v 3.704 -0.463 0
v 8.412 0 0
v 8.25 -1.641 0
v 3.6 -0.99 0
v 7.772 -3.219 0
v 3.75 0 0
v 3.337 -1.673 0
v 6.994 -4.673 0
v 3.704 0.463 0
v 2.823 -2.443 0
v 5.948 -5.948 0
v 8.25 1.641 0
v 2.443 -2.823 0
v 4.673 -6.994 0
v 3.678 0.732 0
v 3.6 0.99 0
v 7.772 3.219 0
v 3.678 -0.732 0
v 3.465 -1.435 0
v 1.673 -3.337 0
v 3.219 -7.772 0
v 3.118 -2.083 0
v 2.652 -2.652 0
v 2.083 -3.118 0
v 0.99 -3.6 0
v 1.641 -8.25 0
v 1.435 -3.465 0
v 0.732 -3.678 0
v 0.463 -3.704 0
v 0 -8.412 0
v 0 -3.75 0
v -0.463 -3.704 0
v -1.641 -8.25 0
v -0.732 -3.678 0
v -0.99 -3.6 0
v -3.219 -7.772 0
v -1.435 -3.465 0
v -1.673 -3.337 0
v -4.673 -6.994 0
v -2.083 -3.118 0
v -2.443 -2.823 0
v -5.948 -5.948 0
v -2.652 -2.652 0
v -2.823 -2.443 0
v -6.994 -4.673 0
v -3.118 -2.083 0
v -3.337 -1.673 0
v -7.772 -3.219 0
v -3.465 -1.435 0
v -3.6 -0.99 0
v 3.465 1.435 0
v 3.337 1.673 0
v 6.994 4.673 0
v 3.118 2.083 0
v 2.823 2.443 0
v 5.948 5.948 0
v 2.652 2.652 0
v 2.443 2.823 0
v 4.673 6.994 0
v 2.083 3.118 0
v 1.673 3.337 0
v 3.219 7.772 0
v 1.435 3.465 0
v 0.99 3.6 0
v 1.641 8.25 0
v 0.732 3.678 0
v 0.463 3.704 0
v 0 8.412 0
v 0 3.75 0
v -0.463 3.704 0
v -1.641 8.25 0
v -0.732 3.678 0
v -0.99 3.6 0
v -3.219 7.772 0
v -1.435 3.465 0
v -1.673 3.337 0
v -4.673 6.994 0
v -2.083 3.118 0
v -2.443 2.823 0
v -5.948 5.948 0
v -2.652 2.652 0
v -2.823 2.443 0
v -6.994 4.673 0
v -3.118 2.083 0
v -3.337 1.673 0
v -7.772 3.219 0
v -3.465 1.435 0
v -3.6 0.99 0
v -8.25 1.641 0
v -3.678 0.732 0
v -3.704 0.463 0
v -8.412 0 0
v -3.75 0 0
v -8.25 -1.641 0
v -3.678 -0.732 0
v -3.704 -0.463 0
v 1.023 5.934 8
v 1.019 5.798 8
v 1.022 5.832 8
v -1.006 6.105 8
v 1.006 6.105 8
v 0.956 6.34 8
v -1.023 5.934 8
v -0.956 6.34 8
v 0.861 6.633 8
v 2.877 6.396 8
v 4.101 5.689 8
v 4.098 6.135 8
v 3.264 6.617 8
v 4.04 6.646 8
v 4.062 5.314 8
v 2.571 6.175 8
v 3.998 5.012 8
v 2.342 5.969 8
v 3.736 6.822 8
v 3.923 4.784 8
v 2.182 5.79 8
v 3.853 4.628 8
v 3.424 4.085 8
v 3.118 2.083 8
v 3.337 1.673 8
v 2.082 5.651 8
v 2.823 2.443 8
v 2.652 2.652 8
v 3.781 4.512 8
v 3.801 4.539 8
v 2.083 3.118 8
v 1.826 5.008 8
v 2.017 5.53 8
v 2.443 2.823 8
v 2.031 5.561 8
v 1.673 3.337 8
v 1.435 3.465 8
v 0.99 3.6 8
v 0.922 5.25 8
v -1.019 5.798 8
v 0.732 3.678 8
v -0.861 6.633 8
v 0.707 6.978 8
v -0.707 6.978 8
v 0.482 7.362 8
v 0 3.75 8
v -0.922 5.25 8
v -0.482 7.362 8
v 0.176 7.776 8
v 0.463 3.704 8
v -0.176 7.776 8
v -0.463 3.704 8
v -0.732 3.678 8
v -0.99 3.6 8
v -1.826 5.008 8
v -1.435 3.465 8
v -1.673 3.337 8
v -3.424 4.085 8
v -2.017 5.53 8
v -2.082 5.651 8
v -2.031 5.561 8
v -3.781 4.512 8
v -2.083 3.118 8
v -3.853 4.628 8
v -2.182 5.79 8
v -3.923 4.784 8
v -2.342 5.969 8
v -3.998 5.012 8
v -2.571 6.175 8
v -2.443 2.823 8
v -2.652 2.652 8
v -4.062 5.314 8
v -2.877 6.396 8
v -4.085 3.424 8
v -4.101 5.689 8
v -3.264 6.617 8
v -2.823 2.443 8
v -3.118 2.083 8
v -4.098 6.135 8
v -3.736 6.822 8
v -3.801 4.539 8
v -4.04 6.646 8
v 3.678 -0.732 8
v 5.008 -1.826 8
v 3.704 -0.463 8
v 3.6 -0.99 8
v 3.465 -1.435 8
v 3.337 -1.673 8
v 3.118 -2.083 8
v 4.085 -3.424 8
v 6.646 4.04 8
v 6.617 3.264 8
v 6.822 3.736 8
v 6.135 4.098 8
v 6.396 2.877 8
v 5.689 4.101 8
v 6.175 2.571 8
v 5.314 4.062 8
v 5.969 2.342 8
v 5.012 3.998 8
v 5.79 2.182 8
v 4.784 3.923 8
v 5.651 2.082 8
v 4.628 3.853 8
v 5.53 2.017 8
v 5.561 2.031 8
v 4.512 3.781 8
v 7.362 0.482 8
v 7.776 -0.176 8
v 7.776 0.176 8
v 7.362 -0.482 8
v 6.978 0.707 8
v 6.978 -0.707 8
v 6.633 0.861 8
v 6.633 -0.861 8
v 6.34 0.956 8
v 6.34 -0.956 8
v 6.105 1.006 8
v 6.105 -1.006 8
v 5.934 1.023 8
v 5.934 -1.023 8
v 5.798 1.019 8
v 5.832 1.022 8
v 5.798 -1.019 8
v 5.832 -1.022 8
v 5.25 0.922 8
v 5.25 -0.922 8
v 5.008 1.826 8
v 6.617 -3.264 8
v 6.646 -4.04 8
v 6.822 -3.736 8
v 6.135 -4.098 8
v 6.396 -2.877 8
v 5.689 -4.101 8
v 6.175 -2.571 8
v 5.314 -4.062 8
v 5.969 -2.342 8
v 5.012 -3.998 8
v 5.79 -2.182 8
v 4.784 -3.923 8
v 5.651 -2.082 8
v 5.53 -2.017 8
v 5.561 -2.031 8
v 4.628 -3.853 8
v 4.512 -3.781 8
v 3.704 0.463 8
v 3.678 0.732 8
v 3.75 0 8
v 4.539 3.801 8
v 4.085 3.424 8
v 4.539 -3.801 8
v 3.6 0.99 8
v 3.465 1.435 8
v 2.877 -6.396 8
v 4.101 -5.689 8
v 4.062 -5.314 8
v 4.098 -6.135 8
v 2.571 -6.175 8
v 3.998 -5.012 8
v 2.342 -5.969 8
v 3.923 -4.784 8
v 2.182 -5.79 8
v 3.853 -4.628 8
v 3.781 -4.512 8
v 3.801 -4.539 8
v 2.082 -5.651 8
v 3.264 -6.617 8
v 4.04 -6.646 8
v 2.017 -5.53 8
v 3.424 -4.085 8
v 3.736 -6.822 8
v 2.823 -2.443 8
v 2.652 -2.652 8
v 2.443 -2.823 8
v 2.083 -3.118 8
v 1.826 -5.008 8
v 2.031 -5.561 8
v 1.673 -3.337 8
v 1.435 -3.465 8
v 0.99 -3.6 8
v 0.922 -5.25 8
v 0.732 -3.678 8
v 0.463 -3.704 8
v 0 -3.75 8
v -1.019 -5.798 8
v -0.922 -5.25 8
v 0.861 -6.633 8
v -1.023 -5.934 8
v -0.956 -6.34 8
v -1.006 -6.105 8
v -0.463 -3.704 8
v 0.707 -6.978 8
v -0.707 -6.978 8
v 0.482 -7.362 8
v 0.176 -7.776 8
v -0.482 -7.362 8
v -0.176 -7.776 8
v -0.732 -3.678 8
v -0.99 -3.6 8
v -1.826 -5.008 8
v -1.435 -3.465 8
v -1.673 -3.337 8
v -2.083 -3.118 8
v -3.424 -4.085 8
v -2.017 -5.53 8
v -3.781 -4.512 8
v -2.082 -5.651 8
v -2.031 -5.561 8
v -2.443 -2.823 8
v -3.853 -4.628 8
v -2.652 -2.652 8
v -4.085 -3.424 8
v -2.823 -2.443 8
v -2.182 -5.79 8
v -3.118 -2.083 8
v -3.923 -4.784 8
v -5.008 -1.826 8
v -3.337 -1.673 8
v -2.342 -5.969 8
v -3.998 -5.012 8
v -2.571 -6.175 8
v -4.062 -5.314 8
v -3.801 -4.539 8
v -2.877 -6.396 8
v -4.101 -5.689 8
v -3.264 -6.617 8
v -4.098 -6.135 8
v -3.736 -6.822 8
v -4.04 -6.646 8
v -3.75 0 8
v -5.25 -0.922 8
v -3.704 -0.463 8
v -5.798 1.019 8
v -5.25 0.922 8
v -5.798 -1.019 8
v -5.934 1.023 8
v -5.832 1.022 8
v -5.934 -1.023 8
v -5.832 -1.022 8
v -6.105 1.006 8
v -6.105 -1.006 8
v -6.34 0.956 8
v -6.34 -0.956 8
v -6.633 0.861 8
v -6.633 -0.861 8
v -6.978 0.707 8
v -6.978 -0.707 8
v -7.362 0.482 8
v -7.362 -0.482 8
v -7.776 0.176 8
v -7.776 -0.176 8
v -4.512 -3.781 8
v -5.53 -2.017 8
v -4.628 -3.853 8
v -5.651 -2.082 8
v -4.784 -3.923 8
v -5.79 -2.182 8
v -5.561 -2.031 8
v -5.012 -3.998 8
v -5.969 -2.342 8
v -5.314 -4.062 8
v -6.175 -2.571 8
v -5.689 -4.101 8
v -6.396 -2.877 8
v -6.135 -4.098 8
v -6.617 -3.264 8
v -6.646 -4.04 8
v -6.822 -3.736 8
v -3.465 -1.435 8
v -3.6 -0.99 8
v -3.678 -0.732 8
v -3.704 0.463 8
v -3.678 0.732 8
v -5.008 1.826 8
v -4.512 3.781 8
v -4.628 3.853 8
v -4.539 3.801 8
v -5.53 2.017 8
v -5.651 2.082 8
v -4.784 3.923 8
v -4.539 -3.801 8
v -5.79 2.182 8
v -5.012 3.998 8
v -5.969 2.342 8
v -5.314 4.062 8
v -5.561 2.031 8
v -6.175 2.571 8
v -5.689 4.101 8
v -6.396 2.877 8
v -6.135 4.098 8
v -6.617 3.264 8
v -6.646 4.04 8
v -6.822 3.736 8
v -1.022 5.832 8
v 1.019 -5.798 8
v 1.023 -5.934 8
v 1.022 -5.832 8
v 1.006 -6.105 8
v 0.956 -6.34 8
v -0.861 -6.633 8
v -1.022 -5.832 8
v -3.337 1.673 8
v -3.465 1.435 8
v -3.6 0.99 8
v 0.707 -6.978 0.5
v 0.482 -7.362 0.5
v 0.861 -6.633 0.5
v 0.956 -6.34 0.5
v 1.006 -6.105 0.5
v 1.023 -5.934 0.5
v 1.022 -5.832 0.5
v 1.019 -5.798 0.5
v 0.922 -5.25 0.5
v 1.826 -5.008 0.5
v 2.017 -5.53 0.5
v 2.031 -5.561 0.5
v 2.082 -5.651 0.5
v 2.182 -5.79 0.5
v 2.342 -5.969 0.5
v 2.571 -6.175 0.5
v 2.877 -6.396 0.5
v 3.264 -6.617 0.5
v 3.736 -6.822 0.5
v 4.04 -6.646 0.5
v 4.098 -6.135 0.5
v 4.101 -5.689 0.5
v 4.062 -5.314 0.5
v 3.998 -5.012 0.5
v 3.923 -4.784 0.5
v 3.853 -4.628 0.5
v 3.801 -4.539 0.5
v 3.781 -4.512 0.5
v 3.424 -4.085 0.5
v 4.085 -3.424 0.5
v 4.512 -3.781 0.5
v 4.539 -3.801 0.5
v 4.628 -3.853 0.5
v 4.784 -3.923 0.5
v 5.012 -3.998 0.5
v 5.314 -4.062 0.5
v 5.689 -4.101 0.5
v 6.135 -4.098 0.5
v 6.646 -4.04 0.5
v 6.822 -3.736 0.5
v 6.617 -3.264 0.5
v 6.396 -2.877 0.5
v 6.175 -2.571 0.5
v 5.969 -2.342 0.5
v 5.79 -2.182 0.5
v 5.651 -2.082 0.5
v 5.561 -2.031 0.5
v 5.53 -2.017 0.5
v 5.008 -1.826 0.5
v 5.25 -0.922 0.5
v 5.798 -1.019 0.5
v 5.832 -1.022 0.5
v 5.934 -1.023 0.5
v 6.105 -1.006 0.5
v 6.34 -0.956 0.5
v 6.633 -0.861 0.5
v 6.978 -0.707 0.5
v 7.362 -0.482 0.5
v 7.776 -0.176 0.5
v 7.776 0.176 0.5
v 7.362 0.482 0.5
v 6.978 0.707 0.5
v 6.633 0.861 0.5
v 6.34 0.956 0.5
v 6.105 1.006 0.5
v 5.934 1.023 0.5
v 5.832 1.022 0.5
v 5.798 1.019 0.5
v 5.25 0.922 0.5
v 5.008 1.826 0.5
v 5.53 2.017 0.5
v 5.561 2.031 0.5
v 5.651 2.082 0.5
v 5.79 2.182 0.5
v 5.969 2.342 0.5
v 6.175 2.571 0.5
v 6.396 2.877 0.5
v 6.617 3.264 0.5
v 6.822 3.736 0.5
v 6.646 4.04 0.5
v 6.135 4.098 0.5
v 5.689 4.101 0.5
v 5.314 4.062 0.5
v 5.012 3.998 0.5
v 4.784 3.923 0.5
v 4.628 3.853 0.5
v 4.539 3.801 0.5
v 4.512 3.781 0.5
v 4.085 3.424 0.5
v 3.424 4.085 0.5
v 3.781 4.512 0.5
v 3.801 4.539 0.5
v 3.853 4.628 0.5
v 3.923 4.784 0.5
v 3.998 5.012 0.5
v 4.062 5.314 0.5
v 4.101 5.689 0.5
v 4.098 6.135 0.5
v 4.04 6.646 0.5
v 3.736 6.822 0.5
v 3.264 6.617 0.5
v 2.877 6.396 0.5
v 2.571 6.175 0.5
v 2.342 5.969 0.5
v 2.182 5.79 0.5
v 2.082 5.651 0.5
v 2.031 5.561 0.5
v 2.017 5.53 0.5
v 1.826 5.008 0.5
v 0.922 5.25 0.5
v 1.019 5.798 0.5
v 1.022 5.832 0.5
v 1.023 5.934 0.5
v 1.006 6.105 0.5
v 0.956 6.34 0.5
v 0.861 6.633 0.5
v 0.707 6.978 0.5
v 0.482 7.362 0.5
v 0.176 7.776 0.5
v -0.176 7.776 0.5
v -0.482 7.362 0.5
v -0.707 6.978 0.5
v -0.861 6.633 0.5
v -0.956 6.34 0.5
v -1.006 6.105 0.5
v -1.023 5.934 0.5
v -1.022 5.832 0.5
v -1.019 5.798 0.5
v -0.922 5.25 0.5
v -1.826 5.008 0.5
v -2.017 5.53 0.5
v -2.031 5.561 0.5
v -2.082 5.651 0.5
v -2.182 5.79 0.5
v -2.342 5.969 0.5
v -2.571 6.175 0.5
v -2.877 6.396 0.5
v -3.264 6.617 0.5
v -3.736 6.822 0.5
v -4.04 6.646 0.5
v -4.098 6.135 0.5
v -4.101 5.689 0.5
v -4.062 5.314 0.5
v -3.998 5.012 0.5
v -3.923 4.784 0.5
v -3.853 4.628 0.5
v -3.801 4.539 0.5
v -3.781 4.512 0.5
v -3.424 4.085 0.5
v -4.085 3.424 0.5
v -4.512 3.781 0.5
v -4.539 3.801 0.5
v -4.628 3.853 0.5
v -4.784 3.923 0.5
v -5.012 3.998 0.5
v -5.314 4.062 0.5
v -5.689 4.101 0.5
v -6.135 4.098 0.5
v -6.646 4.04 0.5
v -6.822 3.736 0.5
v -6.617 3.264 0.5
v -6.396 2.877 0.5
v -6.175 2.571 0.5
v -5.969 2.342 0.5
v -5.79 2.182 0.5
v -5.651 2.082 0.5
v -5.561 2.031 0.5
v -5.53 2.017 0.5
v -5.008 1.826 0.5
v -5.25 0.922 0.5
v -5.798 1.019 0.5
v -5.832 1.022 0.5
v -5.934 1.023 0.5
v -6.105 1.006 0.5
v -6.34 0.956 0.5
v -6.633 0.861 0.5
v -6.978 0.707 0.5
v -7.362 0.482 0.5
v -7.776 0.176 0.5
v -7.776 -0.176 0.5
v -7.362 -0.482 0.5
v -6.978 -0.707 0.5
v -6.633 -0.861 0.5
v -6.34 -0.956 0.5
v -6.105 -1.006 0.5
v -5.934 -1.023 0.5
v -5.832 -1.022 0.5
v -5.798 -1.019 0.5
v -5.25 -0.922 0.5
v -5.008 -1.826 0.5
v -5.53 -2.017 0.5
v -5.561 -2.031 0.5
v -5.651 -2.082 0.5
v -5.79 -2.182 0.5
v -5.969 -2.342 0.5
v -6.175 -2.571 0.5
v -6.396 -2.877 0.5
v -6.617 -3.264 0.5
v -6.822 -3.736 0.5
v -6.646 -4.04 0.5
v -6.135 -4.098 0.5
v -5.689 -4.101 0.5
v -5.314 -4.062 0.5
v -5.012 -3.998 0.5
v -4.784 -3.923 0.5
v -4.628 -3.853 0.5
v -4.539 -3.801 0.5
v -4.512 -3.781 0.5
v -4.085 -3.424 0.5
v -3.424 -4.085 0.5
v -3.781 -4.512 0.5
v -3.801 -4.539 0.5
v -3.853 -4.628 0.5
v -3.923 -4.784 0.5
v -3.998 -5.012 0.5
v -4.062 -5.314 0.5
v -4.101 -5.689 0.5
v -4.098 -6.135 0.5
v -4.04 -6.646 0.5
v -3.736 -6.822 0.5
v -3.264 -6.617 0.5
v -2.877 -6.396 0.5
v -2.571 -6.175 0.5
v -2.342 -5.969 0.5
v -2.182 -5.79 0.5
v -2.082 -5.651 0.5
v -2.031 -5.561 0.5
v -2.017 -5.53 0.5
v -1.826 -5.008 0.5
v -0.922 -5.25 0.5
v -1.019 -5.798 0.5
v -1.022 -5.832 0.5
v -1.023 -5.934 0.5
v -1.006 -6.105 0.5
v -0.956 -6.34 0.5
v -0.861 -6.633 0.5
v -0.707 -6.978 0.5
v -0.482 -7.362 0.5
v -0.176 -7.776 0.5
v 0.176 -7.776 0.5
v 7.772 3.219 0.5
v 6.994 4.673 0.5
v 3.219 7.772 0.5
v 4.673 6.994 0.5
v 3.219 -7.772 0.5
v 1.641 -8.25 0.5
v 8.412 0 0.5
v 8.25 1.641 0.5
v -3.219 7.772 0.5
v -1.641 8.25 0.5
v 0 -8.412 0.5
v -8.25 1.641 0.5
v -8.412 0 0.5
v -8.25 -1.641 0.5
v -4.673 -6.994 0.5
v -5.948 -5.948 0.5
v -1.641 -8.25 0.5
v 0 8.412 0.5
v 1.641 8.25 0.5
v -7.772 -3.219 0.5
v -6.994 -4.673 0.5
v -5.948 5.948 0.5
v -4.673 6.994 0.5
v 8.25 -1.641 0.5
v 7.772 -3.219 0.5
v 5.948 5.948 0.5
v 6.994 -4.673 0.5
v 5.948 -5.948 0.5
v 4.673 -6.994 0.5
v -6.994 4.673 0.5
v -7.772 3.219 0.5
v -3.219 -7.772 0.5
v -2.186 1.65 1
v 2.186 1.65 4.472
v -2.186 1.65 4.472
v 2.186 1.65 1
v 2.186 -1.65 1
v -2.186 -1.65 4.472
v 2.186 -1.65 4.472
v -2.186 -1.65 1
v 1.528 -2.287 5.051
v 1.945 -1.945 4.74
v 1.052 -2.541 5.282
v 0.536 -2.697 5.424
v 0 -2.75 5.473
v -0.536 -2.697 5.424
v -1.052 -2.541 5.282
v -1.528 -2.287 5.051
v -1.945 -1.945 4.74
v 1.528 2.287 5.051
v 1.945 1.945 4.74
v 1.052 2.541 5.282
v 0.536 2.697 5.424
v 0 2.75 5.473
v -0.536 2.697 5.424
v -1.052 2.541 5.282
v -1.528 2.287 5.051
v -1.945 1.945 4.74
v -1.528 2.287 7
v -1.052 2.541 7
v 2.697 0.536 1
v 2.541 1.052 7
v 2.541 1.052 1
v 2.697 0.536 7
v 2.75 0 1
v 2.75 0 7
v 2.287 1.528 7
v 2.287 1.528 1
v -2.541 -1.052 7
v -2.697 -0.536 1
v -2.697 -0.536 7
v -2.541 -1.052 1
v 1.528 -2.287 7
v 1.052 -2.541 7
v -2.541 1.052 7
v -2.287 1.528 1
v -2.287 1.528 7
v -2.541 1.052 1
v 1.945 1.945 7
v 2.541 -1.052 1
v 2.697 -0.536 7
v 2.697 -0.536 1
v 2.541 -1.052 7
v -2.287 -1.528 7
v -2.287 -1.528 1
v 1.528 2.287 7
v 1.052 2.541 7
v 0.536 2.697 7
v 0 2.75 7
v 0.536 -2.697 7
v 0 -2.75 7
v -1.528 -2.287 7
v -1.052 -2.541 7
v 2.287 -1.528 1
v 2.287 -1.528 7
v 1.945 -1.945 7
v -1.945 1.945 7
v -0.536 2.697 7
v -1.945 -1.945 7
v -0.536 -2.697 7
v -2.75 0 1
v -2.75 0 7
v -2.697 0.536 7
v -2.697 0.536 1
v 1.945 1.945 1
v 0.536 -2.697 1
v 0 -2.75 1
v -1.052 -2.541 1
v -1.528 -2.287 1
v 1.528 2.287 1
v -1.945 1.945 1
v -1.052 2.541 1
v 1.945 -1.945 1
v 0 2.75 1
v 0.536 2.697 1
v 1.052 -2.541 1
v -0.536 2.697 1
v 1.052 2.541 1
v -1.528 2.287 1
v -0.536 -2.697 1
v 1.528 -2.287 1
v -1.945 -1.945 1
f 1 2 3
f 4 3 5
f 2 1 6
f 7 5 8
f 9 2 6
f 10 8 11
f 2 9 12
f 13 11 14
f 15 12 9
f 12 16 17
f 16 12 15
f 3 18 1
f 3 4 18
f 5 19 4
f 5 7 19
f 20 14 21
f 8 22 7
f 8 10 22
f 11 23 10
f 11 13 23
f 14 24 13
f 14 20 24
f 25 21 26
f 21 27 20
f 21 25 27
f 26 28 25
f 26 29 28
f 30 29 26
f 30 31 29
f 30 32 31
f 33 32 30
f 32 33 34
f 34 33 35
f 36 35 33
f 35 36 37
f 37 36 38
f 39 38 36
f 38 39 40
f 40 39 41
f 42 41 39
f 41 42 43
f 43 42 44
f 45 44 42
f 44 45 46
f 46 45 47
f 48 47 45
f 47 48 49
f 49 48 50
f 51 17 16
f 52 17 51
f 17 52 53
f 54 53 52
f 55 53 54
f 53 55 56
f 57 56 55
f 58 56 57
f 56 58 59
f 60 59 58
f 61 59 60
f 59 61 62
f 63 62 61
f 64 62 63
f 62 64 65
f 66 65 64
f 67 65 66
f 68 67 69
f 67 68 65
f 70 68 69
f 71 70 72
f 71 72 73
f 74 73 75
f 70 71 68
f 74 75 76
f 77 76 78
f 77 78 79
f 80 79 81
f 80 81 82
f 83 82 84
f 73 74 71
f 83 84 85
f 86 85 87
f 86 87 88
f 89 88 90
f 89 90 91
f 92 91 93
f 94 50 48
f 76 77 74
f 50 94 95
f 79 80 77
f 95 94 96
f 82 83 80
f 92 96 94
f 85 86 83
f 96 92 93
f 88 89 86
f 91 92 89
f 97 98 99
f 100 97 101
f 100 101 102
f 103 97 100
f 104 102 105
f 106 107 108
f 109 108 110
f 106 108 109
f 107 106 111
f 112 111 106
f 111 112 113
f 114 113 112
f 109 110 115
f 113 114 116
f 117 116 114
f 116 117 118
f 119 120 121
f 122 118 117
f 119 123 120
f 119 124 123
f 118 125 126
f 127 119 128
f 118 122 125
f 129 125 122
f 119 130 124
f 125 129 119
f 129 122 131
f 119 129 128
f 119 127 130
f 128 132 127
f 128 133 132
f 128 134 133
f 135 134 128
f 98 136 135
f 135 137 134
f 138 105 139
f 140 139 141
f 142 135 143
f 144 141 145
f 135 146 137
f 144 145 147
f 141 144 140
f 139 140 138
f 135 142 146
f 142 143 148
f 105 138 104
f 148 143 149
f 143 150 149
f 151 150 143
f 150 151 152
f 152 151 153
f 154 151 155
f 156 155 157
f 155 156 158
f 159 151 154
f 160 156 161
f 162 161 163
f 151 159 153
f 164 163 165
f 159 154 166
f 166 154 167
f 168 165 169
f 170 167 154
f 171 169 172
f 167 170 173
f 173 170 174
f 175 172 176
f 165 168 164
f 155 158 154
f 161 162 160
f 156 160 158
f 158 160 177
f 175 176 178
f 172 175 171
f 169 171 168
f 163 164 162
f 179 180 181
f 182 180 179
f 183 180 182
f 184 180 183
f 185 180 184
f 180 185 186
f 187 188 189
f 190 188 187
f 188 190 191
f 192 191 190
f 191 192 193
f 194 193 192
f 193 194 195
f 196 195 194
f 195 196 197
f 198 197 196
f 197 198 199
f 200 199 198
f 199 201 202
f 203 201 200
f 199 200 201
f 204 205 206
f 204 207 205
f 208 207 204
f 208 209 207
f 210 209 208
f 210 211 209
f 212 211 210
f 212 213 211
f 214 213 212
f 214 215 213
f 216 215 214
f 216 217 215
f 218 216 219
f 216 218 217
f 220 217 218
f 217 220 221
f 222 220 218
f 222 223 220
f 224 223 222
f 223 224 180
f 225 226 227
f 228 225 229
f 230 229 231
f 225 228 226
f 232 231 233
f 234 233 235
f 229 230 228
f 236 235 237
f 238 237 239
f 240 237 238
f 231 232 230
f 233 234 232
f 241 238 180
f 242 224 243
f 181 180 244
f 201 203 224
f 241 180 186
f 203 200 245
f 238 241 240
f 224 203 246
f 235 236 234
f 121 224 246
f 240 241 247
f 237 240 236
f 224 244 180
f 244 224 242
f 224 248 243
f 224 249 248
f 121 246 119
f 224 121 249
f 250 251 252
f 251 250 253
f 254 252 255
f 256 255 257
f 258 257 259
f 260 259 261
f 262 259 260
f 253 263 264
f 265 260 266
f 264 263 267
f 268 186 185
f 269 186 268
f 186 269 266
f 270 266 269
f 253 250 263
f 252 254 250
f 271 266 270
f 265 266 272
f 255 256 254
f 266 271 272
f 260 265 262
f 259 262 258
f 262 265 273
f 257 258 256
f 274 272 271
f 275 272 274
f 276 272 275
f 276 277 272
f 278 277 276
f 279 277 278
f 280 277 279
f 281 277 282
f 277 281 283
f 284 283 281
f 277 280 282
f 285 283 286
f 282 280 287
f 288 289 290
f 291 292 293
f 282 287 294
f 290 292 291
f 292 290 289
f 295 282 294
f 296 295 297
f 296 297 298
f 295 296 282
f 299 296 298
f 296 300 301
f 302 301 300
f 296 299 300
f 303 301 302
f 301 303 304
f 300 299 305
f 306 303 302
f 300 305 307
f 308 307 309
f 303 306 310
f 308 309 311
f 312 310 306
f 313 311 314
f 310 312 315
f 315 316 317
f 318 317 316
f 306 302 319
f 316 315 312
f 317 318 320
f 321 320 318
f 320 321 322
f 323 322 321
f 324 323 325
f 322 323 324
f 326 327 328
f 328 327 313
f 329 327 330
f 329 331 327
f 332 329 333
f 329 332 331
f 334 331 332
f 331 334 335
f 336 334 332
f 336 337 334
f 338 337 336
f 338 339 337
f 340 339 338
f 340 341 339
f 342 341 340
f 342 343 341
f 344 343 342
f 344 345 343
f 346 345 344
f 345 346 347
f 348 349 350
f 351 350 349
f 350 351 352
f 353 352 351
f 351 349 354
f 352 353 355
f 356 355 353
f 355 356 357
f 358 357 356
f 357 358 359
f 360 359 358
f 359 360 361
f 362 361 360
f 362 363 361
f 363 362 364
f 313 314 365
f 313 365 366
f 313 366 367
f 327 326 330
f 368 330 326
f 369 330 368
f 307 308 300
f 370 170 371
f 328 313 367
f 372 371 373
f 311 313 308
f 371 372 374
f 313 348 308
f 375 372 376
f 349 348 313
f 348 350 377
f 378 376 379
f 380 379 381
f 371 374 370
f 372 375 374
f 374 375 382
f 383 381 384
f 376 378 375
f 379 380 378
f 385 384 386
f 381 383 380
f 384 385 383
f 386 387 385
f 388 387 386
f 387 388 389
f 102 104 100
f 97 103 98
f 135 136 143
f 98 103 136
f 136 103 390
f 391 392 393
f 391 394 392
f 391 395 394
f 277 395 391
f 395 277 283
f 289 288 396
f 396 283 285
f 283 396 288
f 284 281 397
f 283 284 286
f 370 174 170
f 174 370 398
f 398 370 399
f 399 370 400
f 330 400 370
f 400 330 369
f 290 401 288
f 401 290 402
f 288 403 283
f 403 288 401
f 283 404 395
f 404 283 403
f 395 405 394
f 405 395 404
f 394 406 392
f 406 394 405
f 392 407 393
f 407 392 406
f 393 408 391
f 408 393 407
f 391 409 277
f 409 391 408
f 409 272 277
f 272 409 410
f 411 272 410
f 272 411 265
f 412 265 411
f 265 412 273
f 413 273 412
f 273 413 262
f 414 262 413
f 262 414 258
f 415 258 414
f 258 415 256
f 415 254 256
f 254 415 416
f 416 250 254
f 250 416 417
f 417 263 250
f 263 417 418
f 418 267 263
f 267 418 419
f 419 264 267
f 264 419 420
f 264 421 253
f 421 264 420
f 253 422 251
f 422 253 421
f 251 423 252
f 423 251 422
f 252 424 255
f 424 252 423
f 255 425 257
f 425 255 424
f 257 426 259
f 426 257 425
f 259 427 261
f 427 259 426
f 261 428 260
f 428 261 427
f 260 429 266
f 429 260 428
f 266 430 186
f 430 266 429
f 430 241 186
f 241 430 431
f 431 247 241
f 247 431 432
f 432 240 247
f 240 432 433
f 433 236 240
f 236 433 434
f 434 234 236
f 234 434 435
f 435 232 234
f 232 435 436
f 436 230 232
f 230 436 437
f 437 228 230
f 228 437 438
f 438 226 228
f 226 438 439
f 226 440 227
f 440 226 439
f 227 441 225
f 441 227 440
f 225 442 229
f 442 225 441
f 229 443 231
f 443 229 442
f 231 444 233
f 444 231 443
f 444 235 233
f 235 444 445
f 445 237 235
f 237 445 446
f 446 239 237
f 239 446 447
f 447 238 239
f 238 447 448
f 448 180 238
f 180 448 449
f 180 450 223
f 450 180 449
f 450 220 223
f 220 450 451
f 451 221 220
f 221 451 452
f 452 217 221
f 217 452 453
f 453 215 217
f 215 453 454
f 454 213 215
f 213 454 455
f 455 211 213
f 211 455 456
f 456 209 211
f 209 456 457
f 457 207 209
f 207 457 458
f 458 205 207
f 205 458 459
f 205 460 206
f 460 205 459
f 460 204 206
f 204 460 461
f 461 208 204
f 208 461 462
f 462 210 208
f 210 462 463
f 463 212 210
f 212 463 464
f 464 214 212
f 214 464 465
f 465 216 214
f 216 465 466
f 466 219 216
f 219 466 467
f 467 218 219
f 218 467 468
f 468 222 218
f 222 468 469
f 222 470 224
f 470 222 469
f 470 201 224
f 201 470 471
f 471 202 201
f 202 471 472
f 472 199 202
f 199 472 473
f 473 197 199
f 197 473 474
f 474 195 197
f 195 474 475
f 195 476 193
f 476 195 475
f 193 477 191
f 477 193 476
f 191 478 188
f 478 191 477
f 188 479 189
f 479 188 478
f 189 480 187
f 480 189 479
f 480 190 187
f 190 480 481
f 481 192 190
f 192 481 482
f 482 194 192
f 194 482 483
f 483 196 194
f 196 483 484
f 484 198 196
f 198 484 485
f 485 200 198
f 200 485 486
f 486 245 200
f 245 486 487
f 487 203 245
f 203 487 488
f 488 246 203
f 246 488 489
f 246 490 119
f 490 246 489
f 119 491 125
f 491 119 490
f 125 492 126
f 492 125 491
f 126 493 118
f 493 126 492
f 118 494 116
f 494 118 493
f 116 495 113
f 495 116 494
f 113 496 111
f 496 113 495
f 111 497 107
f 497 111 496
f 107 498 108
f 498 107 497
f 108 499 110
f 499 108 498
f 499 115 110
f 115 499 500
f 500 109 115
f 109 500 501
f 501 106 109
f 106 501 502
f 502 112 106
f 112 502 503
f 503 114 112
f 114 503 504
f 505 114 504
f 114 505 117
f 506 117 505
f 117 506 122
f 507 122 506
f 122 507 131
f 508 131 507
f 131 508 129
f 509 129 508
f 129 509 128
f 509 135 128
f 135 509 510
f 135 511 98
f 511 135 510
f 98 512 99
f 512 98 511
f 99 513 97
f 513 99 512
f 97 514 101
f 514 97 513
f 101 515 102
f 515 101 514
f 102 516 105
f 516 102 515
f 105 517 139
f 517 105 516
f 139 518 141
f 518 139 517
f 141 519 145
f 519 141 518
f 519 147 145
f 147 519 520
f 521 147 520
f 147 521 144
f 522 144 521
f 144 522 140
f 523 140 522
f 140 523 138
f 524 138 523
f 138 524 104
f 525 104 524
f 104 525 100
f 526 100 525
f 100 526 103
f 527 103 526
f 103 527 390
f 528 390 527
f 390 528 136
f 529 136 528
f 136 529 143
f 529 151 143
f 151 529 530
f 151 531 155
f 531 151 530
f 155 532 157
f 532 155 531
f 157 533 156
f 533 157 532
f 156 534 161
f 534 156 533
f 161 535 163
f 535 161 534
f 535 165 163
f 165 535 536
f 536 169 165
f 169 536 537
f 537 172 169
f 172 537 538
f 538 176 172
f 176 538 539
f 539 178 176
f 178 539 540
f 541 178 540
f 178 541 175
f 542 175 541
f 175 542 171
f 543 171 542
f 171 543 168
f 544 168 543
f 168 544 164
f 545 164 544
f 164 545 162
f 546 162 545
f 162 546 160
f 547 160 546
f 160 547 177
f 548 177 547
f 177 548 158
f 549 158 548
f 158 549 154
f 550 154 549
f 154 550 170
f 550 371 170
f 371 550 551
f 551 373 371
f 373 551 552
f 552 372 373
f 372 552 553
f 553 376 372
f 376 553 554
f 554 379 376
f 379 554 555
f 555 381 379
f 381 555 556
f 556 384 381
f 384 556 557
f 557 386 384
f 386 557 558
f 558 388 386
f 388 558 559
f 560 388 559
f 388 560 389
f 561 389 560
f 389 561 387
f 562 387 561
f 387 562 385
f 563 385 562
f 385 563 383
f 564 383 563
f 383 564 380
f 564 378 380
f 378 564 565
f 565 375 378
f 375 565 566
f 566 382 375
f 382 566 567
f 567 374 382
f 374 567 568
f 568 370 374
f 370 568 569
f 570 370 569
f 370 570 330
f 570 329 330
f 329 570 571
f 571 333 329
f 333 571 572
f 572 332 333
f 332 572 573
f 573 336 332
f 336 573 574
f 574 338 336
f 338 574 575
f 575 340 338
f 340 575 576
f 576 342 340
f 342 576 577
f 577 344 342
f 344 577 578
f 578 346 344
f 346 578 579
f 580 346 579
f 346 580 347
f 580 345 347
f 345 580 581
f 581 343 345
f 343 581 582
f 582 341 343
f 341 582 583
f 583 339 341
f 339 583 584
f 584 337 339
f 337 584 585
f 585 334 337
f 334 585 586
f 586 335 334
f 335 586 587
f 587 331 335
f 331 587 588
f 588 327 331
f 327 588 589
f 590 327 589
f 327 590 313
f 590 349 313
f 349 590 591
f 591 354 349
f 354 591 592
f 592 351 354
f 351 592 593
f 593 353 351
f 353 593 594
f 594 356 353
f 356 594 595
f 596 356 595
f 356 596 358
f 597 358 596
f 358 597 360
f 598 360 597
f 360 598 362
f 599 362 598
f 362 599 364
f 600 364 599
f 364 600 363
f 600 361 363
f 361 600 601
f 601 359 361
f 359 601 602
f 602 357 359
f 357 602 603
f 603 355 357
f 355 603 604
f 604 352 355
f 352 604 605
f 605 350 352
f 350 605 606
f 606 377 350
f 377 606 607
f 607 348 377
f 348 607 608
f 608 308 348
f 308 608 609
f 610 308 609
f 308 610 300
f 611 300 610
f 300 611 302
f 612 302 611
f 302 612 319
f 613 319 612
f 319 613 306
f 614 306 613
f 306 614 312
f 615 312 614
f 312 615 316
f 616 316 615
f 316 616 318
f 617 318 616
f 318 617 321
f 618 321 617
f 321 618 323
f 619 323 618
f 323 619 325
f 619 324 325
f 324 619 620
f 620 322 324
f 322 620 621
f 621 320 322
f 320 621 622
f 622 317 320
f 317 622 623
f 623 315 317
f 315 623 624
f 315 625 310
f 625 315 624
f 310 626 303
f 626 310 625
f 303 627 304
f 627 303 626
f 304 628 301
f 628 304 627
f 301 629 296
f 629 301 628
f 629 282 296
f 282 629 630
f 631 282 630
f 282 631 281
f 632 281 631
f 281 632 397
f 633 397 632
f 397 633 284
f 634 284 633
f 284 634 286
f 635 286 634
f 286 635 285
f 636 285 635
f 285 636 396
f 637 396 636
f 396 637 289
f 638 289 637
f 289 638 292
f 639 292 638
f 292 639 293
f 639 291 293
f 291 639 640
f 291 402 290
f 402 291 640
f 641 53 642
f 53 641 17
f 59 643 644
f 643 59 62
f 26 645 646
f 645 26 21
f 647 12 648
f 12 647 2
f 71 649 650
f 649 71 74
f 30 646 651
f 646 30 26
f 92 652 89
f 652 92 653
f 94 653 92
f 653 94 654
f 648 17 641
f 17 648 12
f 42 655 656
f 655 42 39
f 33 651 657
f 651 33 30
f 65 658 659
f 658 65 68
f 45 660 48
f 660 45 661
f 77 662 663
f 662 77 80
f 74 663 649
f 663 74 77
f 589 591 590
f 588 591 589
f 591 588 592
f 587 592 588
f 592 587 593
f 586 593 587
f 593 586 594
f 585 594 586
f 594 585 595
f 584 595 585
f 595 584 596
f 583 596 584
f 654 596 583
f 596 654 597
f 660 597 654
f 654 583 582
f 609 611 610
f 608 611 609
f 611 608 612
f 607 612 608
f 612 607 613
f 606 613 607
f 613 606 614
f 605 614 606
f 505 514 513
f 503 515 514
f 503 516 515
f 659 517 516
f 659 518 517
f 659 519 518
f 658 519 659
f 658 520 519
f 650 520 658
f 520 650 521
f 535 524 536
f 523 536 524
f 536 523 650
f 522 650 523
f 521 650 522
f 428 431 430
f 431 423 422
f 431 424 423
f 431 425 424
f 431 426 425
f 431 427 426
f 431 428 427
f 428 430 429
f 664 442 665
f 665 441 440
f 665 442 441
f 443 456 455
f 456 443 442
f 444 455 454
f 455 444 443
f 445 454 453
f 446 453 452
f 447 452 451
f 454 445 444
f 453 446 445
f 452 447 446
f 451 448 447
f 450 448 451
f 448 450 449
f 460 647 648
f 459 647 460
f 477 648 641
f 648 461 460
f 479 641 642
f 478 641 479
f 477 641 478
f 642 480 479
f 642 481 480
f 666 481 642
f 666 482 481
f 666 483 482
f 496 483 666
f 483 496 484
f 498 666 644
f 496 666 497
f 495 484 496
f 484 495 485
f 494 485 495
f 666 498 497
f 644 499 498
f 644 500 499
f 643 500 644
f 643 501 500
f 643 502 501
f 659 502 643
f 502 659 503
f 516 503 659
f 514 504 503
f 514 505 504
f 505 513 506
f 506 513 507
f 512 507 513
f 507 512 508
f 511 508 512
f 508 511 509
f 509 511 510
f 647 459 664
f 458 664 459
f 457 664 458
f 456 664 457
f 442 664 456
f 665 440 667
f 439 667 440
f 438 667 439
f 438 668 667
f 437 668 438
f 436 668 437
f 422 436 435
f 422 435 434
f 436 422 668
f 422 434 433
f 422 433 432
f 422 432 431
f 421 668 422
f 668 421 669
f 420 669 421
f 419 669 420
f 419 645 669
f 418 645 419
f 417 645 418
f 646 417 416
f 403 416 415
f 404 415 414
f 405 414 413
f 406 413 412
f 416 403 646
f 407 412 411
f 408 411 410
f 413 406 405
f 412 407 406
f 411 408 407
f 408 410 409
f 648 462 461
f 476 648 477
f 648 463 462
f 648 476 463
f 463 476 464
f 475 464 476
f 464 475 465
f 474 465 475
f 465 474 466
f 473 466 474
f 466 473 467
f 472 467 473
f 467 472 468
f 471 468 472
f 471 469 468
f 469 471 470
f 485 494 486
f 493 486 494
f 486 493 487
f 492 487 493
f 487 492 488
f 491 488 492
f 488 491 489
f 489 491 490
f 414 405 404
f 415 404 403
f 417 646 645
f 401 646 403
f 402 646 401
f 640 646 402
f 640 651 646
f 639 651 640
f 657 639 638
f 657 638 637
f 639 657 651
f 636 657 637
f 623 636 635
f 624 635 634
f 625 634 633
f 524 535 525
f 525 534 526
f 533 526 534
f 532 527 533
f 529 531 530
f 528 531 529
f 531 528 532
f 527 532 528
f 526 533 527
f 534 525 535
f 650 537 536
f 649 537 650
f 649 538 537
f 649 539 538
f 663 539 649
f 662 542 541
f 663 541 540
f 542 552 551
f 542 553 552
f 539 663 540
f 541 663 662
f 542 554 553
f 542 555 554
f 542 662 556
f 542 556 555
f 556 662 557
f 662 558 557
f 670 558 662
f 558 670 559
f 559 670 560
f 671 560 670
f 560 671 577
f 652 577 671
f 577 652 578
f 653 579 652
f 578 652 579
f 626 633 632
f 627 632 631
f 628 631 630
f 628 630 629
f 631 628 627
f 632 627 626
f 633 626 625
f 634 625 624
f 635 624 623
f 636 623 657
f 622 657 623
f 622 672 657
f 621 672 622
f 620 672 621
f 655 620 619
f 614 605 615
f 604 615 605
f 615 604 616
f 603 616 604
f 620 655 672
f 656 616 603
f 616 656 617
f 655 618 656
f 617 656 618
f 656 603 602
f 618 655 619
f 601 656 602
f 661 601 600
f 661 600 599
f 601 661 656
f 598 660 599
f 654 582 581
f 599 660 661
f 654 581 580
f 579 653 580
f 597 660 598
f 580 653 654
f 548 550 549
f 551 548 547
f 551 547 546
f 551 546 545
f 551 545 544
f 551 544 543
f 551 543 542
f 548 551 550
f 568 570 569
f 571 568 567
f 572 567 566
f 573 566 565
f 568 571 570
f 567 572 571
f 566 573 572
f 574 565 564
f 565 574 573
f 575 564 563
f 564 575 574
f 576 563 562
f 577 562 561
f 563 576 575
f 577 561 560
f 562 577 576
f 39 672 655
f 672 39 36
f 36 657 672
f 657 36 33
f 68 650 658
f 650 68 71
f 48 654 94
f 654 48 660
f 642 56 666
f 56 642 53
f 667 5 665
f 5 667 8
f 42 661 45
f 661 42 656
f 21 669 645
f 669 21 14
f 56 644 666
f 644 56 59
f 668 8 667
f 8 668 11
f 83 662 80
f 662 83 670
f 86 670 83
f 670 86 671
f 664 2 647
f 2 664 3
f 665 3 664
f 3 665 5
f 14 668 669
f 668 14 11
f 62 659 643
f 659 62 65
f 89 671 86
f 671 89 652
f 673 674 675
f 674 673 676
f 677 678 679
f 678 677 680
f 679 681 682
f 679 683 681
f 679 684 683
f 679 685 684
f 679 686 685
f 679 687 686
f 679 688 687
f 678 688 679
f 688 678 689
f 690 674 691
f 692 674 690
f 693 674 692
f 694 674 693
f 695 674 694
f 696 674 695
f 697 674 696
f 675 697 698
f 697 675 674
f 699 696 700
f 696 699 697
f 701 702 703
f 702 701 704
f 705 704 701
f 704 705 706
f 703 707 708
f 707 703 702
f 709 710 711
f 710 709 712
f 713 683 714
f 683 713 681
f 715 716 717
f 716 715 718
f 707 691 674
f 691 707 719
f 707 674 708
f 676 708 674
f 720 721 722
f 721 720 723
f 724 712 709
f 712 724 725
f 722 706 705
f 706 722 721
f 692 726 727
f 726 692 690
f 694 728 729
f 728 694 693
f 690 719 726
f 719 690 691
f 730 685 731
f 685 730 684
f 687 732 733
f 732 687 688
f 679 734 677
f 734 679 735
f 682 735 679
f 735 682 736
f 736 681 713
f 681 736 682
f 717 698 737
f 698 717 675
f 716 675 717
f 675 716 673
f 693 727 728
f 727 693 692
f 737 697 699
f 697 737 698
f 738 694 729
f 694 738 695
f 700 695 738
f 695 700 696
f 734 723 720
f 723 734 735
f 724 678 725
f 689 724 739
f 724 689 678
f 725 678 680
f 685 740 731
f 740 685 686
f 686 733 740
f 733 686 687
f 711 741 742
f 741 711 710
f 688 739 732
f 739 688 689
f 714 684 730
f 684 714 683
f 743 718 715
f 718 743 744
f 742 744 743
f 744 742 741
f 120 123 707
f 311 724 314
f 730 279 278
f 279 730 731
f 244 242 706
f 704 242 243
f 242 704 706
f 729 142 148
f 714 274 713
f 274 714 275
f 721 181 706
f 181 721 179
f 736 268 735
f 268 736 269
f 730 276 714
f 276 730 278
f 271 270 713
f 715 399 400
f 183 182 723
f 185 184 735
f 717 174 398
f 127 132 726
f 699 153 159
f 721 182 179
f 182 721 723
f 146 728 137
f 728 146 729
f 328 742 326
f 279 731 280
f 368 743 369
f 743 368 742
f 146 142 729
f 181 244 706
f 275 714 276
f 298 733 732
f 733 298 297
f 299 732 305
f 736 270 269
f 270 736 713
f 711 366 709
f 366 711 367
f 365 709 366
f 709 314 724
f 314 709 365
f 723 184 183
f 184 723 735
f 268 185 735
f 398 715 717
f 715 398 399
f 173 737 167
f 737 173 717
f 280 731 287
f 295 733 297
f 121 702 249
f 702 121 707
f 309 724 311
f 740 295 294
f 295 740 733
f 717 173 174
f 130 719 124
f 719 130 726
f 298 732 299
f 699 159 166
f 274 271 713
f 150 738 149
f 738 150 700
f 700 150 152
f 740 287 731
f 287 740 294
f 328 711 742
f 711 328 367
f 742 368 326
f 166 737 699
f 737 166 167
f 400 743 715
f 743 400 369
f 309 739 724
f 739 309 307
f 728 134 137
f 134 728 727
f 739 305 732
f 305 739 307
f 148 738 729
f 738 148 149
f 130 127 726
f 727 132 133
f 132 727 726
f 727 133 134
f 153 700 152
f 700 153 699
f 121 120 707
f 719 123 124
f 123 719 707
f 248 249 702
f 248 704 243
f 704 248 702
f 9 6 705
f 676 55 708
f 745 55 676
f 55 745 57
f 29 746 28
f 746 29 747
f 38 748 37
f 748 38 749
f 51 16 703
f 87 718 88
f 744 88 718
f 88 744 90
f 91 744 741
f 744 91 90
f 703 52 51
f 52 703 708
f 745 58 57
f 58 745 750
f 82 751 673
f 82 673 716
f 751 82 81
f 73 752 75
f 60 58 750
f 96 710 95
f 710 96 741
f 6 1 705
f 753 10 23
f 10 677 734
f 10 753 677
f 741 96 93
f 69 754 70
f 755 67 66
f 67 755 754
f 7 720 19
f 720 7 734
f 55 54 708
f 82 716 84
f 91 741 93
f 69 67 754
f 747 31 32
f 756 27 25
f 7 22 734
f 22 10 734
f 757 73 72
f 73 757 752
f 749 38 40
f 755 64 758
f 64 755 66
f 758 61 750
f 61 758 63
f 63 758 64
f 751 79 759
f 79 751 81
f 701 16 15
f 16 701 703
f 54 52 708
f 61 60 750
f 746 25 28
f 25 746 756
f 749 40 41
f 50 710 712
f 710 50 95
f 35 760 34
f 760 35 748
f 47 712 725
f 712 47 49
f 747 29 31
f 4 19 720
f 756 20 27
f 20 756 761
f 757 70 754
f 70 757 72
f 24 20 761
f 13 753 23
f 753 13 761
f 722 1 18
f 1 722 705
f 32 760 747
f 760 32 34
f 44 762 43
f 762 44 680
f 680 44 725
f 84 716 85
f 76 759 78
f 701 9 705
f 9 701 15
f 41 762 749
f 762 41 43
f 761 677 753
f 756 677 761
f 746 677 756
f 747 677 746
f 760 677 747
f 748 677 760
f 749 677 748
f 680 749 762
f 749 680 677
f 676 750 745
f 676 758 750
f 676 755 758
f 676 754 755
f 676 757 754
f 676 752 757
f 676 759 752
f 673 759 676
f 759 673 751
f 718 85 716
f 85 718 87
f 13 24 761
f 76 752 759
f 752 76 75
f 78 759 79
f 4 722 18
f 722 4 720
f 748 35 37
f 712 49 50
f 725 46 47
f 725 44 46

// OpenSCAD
// file: gears.scad
/******************************************************************
*                                                                 *
* OpenFlexure Microscope: Gears for actuators                     *
*                                                                 *
* This is part of the OpenFlexure microscope, an open-source      *
* microscope and 3-axis translation stage.  It gets really good   *
* precision over a ~10mm range, by using plastic flexure          *
* mechanisms.                                                     *
*                                                                 *
* (c) Richard Bowman, January 2016                                *
* Released under the CERN Open Hardware License                   *
*                                                                 *
******************************************************************/

use <MCAD/involute_gears.scad>; //NB forward slash - it works on 
// both unix-like and Windows platforms. Backslash doesn't...
use <utilities.scad>;

//pi=3.14159;
//$fn=32;
strut_t=3;
depth = 40;
ratio = 2;
teeth_smallgear = 12;
teeth_biggear = teeth_smallgear * ratio;
c2c_distance = 20; //see output from motor_lugs
pitch = c2c_distance * 360 / (teeth_smallgear + teeth_biggear);
d=0.05;

//pitch radius = Nteeth * circular_pitch / 360
//pitch radius is centre of gear to meshing point
//outer radius = pitch radius * (1 + 2*pi/Nteeth)
//our c2c distance is 10+12.5mm=22.5mm, 
module large_gear(){
	assign($fn=32, pi=3.14159, pitch_r=c2c_distance*(ratio/(ratio+1)))
	difference(){
		intersection(){
			gear(number_of_teeth=teeth_biggear,
				circular_pitch=pitch,
				circles=0,
				gear_thickness=6,
				hub_thickness=6,
				hub_diameter=20,
				rim_thickness=6,
				bore_diameter=1);	
			cylinder(r1=pitch_r-2,r2=pitch_r+18,h=20); //stop bottoms of teeth being funny
		}
		translate([0,0,1.5]) nut(3,shaft=true,fudge=1.2,h=999);
//		for(i=[0:5]) rotate(i*60) translate([pitch_r*0.55,0,0.5]) cylinder(r=pitch_r*0.2,h=999);
	}
}

module small_gear(){	
	$fn=32;
    pi=3.14159;
    h=8;
    flat_h=h-3.5;
    shaft_r=5/2*1.1;
    pitch_r=c2c_distance*1/(ratio+1);
	difference(){
		union(){
			gear(number_of_teeth=teeth_smallgear,
					circular_pitch=pitch,
					circles=0,
					gear_thickness=h,
					hub_thickness=h,
					hub_diameter=1,
					rim_thickness=h,
					bore_diameter=1);
				
			cylinder(r=pitch_r+pi*pitch_r/teeth_smallgear,h=0.5); //help adhesion
		}
        //cut-out for motor shaft
		intersection(){
			cylinder(r=shaft_r, h=999, center=true);
			sequential_hull(){
                translate([0,0,-d]) cube([999,3,d]*1.1,center=true);
                translate([0,0,flat_h]) cube([999,3,d]*1.1,center=true);
                translate([0,0,flat_h+2]) cube([999,7,d]*1.1,center=true);
                translate([0,0,999]) cube([999,7,d]*1.1,center=true);
            }
		}
        //chamfer the top/bottom for better fit
        translate([0,0,h]) cylinder(r1=shaft_r,r2=shaft_r+2,h=2,center=true);
        translate([0,0,0]) cylinder(r2=shaft_r,r1=shaft_r+2,h=2,center=true);
	}
}



module thumbwheel(r=10,h=5,knobble_r=1,knobble_angle=45,chamfer=0.5){
    knobble_length=knobble_r * sin(knobble_angle) * 2;
    n_knobbles = floor(2*3.141*r/knobble_length);
    difference(){
        intersection(){
            union(){
                for(i=[1:n_knobbles]) rotate(i/n_knobbles*360){
                    translate([0,r-knobble_r,0]) cylinder(r=knobble_r,h=h,$fn=16);
                }
                cylinder(r=r-knobble_r,h=h,$fn=n_knobbles);
            }
            cylinder(r1=r-knobble_r-chamfer, r2=r-knobble_r-chamfer+999,h=999,$fn=n_knobbles);
            translate([0,0,h-999])cylinder(r2=r-knobble_r, r1=r-knobble_r+999,h=999,$fn=n_knobbles);
        }
        translate([0,0,1.5]) nut(3,shaft=true,fudge=1.2,h=999);
    }
}

//rotate(360/teeth_biggear/2) large_gear();
//translate([c2c_distance*2,00]) small_gear();
//thumbwheel();

repeat([0,c2c_distance/(1/ratio + 1)*2 + 4,0],3,center=true) large_gear();
// main file
/******************************************************************
*                                                                 *
* OpenFlexure Microscope: Gears for actuators                     *
*                                                                 *
* This is part of the OpenFlexure microscope, an open-source      *
* microscope and 3-axis translation stage.  It gets really good   *
* precision over a ~10mm range, by using plastic flexure          *
* mechanisms.                                                     *
* This file generates a small gear, for motor control.            *
*                                                                 *
* (c) Richard Bowman, January 2016                                *
* Released under the CERN Open Hardware License                   *
*                                                                 *
******************************************************************/

use <gears.scad>;

small_gear();
